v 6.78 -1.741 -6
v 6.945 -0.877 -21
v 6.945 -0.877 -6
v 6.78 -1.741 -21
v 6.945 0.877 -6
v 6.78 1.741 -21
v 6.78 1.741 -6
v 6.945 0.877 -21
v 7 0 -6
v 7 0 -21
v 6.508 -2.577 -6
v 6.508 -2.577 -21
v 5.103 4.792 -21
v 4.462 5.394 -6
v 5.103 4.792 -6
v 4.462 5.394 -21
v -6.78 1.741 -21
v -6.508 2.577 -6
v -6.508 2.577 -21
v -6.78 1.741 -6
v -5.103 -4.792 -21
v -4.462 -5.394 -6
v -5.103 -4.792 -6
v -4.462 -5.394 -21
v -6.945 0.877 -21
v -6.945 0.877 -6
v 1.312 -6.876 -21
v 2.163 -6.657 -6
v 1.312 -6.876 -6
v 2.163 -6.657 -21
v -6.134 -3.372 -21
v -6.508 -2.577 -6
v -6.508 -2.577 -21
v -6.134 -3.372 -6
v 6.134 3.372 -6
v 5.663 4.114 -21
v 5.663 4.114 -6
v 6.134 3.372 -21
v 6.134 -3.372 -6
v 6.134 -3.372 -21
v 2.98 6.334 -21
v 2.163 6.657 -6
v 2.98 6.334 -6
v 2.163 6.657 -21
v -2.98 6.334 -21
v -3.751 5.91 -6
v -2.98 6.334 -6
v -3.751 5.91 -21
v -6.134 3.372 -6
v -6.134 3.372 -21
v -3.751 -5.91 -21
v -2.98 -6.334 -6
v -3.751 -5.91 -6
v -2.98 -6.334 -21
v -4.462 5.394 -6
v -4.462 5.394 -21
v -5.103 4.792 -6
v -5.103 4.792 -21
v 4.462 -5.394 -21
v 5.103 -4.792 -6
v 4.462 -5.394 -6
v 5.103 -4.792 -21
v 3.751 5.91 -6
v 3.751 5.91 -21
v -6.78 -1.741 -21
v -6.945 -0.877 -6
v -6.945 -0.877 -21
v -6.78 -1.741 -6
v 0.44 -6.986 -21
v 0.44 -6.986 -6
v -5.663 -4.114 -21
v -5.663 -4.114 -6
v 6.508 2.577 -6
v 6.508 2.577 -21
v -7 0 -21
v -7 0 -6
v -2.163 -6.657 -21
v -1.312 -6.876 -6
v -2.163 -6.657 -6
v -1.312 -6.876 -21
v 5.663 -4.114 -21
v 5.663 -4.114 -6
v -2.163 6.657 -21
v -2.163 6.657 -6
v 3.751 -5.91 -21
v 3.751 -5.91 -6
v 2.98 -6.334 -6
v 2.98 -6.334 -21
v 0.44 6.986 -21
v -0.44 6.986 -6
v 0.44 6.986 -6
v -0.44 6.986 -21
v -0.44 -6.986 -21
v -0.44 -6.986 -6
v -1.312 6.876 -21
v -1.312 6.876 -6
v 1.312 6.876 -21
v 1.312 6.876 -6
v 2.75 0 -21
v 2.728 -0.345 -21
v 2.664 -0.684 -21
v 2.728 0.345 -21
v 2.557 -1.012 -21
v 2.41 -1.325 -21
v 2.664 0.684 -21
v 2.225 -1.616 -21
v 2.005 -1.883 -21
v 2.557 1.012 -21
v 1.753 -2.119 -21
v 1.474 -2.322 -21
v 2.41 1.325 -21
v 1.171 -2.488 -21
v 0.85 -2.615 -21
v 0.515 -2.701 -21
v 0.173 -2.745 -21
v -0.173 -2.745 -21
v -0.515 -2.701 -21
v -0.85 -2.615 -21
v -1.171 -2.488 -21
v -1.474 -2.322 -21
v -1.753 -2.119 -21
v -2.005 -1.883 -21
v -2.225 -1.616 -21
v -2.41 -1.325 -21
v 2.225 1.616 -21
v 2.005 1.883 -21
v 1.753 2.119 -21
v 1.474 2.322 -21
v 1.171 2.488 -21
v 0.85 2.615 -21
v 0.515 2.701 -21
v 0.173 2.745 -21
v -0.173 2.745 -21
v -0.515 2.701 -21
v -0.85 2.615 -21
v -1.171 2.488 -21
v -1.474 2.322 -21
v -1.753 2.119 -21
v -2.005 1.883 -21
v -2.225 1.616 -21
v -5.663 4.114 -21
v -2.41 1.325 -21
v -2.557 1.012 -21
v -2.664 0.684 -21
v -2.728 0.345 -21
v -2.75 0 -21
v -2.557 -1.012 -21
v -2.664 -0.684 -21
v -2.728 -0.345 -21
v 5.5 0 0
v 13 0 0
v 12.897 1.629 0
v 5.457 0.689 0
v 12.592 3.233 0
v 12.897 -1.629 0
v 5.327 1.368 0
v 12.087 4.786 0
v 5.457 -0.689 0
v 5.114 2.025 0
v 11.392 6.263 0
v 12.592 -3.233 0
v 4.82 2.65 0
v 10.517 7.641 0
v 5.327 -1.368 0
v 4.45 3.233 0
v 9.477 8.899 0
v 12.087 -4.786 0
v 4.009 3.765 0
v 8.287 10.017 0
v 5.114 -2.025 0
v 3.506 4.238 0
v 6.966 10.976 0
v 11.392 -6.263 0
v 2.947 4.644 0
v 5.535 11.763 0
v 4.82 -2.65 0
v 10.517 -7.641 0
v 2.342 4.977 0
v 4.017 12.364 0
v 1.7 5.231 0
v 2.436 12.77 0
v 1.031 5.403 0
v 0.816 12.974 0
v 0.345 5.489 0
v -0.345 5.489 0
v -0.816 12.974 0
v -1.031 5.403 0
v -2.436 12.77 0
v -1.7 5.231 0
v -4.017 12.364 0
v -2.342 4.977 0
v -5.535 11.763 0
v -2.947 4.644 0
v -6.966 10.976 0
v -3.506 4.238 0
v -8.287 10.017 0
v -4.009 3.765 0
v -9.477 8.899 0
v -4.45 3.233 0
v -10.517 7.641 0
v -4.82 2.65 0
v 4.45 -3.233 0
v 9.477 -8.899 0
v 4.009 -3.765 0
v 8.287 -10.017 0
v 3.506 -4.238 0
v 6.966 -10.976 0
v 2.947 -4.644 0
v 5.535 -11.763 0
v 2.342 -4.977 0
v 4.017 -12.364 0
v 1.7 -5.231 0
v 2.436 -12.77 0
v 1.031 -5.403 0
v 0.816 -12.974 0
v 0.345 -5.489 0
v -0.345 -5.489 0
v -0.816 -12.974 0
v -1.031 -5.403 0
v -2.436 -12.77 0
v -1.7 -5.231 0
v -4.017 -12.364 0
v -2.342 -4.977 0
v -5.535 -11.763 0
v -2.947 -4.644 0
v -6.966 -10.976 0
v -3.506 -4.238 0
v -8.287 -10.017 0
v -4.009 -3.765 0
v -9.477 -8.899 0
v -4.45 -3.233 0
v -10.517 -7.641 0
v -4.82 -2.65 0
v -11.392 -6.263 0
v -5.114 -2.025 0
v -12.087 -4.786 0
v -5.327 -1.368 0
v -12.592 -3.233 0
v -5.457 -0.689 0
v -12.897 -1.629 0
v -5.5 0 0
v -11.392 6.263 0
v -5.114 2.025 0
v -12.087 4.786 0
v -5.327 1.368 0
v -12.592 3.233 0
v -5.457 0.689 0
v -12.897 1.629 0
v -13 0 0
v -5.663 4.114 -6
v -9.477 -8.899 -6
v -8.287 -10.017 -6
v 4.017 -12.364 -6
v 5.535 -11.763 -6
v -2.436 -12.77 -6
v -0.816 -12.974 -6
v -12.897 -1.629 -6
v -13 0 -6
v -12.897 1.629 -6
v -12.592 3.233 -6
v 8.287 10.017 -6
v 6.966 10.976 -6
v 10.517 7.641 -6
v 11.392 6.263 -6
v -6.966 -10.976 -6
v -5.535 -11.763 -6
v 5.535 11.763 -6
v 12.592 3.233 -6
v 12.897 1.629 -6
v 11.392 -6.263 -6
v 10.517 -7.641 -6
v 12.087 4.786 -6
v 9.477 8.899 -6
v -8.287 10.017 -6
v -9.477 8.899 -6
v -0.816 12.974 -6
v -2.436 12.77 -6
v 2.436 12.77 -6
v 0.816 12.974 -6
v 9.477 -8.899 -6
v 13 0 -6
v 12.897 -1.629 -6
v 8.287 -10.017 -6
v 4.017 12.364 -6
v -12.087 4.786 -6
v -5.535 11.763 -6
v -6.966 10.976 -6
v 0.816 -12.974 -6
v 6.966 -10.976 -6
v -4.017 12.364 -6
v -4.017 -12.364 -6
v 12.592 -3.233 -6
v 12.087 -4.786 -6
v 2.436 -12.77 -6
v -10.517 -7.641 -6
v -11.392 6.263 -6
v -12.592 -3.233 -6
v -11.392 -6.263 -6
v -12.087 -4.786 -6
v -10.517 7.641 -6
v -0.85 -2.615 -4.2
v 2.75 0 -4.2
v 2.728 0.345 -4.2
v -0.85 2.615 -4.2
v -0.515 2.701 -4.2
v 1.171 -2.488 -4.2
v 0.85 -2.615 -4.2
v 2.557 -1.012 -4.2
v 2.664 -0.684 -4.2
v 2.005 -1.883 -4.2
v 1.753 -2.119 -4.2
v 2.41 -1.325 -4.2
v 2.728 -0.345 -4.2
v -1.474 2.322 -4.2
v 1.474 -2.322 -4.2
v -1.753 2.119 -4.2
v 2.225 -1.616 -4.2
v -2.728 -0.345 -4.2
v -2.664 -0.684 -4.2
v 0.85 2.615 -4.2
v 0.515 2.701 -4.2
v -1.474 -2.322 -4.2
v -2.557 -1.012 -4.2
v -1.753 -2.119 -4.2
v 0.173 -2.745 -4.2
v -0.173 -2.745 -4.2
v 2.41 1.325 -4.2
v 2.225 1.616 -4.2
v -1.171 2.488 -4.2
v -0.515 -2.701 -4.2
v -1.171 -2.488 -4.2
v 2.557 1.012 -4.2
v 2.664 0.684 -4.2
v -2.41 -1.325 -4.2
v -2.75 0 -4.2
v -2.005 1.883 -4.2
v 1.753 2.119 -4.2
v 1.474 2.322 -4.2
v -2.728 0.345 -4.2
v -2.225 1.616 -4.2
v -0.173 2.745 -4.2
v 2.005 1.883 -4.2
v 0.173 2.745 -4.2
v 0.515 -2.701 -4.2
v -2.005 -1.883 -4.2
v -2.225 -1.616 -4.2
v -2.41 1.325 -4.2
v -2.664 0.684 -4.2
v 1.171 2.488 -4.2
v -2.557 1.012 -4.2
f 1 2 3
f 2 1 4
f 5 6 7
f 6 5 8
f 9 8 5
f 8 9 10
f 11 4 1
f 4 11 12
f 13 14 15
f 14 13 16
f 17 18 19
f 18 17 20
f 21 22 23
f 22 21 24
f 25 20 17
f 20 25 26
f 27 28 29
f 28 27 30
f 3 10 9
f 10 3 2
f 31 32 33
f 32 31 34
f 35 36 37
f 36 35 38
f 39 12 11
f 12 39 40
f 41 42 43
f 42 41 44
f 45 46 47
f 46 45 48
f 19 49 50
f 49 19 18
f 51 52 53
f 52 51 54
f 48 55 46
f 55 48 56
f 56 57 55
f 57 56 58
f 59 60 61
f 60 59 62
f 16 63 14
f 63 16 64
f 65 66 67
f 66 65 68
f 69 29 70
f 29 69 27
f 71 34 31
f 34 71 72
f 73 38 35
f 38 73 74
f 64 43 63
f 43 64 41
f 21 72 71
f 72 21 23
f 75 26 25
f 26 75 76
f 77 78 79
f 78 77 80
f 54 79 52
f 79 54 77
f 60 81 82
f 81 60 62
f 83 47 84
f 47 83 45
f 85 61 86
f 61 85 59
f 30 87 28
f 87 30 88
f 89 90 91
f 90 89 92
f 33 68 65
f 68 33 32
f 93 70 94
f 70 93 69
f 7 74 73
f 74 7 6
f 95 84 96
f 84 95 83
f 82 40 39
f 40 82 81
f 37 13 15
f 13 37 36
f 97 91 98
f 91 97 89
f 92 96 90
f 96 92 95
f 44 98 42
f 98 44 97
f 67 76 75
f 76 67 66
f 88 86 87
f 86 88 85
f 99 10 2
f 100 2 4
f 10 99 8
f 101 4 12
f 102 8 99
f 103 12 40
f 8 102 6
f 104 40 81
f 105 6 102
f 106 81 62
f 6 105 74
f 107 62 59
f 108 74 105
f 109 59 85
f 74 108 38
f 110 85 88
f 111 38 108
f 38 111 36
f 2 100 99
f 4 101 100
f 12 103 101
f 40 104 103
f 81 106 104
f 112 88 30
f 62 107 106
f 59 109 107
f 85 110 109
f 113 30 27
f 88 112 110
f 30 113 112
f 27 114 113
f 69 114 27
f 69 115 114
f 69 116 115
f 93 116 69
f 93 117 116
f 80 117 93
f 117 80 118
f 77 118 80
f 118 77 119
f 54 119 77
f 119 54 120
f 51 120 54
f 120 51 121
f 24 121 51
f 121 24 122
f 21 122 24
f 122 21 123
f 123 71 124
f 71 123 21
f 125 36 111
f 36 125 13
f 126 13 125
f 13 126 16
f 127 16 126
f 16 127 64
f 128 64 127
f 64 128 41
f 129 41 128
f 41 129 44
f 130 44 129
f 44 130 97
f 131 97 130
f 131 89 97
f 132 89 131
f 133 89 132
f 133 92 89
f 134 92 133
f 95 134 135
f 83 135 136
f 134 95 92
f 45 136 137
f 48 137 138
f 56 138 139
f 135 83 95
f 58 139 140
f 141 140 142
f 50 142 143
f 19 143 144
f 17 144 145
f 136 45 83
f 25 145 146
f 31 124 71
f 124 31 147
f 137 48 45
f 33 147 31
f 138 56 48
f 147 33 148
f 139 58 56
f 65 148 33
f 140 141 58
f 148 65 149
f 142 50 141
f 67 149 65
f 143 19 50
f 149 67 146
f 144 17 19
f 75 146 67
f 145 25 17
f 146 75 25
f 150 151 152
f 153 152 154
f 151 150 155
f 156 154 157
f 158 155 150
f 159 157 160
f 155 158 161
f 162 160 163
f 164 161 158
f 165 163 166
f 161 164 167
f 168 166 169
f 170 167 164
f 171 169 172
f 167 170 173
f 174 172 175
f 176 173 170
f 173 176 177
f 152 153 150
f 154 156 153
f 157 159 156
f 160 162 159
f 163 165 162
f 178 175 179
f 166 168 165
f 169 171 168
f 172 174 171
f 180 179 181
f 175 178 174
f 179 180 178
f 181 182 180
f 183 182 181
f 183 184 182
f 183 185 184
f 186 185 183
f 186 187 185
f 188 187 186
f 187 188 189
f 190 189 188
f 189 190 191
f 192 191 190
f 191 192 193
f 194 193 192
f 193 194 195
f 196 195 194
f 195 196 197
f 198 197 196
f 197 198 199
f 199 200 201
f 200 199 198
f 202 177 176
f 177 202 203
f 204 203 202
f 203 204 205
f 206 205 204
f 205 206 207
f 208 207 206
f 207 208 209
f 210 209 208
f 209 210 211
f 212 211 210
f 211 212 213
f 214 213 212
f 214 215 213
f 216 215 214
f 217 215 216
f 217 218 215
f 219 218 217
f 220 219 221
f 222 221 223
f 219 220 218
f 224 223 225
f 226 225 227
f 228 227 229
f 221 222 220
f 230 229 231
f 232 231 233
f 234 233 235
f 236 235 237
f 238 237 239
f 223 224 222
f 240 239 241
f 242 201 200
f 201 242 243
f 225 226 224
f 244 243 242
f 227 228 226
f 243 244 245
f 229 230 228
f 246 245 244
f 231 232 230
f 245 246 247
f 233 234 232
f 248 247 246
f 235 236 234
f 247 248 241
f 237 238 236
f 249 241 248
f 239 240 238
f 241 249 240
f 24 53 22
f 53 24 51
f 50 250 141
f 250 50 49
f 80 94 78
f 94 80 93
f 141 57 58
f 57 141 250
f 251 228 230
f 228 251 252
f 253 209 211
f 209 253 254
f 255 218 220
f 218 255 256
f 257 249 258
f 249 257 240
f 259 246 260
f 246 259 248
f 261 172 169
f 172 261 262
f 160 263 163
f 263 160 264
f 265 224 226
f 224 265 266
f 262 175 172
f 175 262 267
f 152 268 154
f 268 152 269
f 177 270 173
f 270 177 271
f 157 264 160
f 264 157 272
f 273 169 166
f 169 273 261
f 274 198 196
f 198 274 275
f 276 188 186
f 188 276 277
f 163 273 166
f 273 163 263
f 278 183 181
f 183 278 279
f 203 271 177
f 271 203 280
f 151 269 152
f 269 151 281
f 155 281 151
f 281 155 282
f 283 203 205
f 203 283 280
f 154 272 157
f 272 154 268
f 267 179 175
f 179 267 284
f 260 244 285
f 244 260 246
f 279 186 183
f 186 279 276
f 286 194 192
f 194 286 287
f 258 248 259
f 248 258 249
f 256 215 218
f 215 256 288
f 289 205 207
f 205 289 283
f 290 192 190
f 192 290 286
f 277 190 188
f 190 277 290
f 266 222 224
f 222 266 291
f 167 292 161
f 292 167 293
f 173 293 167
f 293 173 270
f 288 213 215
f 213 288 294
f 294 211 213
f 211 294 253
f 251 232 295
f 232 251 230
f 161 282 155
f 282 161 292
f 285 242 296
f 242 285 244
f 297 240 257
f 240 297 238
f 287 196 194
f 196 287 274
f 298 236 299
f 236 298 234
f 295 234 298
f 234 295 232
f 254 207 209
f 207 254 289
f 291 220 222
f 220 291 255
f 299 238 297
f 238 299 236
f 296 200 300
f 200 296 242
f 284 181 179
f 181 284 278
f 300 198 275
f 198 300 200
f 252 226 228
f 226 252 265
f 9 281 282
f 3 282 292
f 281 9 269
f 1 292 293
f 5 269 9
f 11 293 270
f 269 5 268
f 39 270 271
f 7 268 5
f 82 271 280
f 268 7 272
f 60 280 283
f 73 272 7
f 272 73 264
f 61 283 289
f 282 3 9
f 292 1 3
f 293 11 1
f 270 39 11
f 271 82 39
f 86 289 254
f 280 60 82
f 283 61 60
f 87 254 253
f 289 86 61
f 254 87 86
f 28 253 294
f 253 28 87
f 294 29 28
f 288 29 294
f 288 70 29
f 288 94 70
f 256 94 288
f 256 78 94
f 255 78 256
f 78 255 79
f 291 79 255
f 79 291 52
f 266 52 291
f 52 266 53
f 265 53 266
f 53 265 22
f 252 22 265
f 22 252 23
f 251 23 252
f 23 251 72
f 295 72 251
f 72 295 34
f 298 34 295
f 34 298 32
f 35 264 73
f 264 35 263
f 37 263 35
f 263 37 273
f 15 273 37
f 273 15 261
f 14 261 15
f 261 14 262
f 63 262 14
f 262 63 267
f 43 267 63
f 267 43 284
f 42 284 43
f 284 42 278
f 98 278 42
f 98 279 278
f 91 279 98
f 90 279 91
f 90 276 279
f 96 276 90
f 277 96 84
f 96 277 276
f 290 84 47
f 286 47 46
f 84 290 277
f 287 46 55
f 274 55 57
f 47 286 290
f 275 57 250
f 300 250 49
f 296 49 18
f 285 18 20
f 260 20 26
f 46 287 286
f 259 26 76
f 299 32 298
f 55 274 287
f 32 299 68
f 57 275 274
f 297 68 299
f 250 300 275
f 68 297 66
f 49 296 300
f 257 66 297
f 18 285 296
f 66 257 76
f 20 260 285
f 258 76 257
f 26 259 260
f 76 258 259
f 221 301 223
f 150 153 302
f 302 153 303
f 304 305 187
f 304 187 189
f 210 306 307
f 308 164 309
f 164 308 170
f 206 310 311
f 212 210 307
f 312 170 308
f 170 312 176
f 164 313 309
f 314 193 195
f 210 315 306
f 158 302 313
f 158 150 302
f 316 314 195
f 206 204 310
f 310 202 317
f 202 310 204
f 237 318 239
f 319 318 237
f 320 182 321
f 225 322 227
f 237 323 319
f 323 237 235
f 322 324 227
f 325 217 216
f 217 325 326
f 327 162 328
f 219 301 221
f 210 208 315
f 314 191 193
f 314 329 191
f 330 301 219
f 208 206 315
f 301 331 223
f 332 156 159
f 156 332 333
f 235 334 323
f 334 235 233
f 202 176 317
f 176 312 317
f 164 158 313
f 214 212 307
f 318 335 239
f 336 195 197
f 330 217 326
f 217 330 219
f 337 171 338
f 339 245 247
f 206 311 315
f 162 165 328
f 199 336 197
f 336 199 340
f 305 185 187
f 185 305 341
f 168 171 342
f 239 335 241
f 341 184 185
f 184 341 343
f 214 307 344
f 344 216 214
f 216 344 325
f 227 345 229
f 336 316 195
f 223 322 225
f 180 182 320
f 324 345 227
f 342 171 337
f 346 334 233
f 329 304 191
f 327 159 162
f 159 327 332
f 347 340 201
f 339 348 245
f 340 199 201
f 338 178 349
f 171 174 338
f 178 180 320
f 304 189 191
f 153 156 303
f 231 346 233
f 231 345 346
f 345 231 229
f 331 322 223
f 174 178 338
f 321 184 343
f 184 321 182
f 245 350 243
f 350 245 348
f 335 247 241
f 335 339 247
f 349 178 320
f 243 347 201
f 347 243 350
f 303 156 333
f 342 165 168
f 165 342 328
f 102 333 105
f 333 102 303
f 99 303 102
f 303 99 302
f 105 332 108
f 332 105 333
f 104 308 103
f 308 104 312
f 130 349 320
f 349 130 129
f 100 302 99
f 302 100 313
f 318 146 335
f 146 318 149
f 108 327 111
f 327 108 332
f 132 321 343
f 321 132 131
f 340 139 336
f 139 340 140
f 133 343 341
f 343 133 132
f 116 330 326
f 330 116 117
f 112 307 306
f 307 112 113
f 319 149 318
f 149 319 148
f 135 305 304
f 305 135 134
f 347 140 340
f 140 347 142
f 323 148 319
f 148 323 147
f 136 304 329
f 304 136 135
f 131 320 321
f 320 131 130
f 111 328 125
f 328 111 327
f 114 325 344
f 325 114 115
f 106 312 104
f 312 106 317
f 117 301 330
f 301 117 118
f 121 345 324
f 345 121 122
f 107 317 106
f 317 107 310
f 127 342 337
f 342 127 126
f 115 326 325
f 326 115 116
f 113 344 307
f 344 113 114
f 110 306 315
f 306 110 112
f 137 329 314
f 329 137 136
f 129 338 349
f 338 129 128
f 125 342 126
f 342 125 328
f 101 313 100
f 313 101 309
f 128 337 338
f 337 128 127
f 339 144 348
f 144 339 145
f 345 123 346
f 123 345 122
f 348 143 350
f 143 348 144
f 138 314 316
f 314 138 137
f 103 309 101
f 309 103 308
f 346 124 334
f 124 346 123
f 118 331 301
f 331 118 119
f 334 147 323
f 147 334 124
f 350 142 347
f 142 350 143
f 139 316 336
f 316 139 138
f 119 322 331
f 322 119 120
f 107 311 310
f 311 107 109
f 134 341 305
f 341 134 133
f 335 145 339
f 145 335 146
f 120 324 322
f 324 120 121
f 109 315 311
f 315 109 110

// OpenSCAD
$fn = 50;


difference() {
	union() {
		translate(v = [0, 0, -21.0000000000]) {
			cylinder(h = 21, r = 7.0000000000);
		}
		translate(v = [0, 0, -6.0000000000]) {
			cylinder(h = 6, r = 13.0000000000);
		}
	}
	union() {
		translate(v = [0, 0, 0]) {
			rotate(a = [0, 0, 0]) {
				difference() {
					union() {
						#translate(v = [0, 0, -21.0000000000]) {
							cylinder(h = 21, r = 2.2500000000);
						}
						#translate(v = [0, 0, -4.2000000000]) {
							cylinder(h = 4.2000000000, r = 7.0000000000, r1 = 2.7500000000, r2 = 5.5000000000);
						}
						#translate(v = [0, 0, -21.0000000000]) {
							cylinder(h = 21, r = 2.7500000000);
						}
						#translate(v = [0, 0, -21.0000000000]) {
							cylinder(h = 21, r = 2.2500000000);
						}
					}
					union();
				}
			}
		}
	}
}
